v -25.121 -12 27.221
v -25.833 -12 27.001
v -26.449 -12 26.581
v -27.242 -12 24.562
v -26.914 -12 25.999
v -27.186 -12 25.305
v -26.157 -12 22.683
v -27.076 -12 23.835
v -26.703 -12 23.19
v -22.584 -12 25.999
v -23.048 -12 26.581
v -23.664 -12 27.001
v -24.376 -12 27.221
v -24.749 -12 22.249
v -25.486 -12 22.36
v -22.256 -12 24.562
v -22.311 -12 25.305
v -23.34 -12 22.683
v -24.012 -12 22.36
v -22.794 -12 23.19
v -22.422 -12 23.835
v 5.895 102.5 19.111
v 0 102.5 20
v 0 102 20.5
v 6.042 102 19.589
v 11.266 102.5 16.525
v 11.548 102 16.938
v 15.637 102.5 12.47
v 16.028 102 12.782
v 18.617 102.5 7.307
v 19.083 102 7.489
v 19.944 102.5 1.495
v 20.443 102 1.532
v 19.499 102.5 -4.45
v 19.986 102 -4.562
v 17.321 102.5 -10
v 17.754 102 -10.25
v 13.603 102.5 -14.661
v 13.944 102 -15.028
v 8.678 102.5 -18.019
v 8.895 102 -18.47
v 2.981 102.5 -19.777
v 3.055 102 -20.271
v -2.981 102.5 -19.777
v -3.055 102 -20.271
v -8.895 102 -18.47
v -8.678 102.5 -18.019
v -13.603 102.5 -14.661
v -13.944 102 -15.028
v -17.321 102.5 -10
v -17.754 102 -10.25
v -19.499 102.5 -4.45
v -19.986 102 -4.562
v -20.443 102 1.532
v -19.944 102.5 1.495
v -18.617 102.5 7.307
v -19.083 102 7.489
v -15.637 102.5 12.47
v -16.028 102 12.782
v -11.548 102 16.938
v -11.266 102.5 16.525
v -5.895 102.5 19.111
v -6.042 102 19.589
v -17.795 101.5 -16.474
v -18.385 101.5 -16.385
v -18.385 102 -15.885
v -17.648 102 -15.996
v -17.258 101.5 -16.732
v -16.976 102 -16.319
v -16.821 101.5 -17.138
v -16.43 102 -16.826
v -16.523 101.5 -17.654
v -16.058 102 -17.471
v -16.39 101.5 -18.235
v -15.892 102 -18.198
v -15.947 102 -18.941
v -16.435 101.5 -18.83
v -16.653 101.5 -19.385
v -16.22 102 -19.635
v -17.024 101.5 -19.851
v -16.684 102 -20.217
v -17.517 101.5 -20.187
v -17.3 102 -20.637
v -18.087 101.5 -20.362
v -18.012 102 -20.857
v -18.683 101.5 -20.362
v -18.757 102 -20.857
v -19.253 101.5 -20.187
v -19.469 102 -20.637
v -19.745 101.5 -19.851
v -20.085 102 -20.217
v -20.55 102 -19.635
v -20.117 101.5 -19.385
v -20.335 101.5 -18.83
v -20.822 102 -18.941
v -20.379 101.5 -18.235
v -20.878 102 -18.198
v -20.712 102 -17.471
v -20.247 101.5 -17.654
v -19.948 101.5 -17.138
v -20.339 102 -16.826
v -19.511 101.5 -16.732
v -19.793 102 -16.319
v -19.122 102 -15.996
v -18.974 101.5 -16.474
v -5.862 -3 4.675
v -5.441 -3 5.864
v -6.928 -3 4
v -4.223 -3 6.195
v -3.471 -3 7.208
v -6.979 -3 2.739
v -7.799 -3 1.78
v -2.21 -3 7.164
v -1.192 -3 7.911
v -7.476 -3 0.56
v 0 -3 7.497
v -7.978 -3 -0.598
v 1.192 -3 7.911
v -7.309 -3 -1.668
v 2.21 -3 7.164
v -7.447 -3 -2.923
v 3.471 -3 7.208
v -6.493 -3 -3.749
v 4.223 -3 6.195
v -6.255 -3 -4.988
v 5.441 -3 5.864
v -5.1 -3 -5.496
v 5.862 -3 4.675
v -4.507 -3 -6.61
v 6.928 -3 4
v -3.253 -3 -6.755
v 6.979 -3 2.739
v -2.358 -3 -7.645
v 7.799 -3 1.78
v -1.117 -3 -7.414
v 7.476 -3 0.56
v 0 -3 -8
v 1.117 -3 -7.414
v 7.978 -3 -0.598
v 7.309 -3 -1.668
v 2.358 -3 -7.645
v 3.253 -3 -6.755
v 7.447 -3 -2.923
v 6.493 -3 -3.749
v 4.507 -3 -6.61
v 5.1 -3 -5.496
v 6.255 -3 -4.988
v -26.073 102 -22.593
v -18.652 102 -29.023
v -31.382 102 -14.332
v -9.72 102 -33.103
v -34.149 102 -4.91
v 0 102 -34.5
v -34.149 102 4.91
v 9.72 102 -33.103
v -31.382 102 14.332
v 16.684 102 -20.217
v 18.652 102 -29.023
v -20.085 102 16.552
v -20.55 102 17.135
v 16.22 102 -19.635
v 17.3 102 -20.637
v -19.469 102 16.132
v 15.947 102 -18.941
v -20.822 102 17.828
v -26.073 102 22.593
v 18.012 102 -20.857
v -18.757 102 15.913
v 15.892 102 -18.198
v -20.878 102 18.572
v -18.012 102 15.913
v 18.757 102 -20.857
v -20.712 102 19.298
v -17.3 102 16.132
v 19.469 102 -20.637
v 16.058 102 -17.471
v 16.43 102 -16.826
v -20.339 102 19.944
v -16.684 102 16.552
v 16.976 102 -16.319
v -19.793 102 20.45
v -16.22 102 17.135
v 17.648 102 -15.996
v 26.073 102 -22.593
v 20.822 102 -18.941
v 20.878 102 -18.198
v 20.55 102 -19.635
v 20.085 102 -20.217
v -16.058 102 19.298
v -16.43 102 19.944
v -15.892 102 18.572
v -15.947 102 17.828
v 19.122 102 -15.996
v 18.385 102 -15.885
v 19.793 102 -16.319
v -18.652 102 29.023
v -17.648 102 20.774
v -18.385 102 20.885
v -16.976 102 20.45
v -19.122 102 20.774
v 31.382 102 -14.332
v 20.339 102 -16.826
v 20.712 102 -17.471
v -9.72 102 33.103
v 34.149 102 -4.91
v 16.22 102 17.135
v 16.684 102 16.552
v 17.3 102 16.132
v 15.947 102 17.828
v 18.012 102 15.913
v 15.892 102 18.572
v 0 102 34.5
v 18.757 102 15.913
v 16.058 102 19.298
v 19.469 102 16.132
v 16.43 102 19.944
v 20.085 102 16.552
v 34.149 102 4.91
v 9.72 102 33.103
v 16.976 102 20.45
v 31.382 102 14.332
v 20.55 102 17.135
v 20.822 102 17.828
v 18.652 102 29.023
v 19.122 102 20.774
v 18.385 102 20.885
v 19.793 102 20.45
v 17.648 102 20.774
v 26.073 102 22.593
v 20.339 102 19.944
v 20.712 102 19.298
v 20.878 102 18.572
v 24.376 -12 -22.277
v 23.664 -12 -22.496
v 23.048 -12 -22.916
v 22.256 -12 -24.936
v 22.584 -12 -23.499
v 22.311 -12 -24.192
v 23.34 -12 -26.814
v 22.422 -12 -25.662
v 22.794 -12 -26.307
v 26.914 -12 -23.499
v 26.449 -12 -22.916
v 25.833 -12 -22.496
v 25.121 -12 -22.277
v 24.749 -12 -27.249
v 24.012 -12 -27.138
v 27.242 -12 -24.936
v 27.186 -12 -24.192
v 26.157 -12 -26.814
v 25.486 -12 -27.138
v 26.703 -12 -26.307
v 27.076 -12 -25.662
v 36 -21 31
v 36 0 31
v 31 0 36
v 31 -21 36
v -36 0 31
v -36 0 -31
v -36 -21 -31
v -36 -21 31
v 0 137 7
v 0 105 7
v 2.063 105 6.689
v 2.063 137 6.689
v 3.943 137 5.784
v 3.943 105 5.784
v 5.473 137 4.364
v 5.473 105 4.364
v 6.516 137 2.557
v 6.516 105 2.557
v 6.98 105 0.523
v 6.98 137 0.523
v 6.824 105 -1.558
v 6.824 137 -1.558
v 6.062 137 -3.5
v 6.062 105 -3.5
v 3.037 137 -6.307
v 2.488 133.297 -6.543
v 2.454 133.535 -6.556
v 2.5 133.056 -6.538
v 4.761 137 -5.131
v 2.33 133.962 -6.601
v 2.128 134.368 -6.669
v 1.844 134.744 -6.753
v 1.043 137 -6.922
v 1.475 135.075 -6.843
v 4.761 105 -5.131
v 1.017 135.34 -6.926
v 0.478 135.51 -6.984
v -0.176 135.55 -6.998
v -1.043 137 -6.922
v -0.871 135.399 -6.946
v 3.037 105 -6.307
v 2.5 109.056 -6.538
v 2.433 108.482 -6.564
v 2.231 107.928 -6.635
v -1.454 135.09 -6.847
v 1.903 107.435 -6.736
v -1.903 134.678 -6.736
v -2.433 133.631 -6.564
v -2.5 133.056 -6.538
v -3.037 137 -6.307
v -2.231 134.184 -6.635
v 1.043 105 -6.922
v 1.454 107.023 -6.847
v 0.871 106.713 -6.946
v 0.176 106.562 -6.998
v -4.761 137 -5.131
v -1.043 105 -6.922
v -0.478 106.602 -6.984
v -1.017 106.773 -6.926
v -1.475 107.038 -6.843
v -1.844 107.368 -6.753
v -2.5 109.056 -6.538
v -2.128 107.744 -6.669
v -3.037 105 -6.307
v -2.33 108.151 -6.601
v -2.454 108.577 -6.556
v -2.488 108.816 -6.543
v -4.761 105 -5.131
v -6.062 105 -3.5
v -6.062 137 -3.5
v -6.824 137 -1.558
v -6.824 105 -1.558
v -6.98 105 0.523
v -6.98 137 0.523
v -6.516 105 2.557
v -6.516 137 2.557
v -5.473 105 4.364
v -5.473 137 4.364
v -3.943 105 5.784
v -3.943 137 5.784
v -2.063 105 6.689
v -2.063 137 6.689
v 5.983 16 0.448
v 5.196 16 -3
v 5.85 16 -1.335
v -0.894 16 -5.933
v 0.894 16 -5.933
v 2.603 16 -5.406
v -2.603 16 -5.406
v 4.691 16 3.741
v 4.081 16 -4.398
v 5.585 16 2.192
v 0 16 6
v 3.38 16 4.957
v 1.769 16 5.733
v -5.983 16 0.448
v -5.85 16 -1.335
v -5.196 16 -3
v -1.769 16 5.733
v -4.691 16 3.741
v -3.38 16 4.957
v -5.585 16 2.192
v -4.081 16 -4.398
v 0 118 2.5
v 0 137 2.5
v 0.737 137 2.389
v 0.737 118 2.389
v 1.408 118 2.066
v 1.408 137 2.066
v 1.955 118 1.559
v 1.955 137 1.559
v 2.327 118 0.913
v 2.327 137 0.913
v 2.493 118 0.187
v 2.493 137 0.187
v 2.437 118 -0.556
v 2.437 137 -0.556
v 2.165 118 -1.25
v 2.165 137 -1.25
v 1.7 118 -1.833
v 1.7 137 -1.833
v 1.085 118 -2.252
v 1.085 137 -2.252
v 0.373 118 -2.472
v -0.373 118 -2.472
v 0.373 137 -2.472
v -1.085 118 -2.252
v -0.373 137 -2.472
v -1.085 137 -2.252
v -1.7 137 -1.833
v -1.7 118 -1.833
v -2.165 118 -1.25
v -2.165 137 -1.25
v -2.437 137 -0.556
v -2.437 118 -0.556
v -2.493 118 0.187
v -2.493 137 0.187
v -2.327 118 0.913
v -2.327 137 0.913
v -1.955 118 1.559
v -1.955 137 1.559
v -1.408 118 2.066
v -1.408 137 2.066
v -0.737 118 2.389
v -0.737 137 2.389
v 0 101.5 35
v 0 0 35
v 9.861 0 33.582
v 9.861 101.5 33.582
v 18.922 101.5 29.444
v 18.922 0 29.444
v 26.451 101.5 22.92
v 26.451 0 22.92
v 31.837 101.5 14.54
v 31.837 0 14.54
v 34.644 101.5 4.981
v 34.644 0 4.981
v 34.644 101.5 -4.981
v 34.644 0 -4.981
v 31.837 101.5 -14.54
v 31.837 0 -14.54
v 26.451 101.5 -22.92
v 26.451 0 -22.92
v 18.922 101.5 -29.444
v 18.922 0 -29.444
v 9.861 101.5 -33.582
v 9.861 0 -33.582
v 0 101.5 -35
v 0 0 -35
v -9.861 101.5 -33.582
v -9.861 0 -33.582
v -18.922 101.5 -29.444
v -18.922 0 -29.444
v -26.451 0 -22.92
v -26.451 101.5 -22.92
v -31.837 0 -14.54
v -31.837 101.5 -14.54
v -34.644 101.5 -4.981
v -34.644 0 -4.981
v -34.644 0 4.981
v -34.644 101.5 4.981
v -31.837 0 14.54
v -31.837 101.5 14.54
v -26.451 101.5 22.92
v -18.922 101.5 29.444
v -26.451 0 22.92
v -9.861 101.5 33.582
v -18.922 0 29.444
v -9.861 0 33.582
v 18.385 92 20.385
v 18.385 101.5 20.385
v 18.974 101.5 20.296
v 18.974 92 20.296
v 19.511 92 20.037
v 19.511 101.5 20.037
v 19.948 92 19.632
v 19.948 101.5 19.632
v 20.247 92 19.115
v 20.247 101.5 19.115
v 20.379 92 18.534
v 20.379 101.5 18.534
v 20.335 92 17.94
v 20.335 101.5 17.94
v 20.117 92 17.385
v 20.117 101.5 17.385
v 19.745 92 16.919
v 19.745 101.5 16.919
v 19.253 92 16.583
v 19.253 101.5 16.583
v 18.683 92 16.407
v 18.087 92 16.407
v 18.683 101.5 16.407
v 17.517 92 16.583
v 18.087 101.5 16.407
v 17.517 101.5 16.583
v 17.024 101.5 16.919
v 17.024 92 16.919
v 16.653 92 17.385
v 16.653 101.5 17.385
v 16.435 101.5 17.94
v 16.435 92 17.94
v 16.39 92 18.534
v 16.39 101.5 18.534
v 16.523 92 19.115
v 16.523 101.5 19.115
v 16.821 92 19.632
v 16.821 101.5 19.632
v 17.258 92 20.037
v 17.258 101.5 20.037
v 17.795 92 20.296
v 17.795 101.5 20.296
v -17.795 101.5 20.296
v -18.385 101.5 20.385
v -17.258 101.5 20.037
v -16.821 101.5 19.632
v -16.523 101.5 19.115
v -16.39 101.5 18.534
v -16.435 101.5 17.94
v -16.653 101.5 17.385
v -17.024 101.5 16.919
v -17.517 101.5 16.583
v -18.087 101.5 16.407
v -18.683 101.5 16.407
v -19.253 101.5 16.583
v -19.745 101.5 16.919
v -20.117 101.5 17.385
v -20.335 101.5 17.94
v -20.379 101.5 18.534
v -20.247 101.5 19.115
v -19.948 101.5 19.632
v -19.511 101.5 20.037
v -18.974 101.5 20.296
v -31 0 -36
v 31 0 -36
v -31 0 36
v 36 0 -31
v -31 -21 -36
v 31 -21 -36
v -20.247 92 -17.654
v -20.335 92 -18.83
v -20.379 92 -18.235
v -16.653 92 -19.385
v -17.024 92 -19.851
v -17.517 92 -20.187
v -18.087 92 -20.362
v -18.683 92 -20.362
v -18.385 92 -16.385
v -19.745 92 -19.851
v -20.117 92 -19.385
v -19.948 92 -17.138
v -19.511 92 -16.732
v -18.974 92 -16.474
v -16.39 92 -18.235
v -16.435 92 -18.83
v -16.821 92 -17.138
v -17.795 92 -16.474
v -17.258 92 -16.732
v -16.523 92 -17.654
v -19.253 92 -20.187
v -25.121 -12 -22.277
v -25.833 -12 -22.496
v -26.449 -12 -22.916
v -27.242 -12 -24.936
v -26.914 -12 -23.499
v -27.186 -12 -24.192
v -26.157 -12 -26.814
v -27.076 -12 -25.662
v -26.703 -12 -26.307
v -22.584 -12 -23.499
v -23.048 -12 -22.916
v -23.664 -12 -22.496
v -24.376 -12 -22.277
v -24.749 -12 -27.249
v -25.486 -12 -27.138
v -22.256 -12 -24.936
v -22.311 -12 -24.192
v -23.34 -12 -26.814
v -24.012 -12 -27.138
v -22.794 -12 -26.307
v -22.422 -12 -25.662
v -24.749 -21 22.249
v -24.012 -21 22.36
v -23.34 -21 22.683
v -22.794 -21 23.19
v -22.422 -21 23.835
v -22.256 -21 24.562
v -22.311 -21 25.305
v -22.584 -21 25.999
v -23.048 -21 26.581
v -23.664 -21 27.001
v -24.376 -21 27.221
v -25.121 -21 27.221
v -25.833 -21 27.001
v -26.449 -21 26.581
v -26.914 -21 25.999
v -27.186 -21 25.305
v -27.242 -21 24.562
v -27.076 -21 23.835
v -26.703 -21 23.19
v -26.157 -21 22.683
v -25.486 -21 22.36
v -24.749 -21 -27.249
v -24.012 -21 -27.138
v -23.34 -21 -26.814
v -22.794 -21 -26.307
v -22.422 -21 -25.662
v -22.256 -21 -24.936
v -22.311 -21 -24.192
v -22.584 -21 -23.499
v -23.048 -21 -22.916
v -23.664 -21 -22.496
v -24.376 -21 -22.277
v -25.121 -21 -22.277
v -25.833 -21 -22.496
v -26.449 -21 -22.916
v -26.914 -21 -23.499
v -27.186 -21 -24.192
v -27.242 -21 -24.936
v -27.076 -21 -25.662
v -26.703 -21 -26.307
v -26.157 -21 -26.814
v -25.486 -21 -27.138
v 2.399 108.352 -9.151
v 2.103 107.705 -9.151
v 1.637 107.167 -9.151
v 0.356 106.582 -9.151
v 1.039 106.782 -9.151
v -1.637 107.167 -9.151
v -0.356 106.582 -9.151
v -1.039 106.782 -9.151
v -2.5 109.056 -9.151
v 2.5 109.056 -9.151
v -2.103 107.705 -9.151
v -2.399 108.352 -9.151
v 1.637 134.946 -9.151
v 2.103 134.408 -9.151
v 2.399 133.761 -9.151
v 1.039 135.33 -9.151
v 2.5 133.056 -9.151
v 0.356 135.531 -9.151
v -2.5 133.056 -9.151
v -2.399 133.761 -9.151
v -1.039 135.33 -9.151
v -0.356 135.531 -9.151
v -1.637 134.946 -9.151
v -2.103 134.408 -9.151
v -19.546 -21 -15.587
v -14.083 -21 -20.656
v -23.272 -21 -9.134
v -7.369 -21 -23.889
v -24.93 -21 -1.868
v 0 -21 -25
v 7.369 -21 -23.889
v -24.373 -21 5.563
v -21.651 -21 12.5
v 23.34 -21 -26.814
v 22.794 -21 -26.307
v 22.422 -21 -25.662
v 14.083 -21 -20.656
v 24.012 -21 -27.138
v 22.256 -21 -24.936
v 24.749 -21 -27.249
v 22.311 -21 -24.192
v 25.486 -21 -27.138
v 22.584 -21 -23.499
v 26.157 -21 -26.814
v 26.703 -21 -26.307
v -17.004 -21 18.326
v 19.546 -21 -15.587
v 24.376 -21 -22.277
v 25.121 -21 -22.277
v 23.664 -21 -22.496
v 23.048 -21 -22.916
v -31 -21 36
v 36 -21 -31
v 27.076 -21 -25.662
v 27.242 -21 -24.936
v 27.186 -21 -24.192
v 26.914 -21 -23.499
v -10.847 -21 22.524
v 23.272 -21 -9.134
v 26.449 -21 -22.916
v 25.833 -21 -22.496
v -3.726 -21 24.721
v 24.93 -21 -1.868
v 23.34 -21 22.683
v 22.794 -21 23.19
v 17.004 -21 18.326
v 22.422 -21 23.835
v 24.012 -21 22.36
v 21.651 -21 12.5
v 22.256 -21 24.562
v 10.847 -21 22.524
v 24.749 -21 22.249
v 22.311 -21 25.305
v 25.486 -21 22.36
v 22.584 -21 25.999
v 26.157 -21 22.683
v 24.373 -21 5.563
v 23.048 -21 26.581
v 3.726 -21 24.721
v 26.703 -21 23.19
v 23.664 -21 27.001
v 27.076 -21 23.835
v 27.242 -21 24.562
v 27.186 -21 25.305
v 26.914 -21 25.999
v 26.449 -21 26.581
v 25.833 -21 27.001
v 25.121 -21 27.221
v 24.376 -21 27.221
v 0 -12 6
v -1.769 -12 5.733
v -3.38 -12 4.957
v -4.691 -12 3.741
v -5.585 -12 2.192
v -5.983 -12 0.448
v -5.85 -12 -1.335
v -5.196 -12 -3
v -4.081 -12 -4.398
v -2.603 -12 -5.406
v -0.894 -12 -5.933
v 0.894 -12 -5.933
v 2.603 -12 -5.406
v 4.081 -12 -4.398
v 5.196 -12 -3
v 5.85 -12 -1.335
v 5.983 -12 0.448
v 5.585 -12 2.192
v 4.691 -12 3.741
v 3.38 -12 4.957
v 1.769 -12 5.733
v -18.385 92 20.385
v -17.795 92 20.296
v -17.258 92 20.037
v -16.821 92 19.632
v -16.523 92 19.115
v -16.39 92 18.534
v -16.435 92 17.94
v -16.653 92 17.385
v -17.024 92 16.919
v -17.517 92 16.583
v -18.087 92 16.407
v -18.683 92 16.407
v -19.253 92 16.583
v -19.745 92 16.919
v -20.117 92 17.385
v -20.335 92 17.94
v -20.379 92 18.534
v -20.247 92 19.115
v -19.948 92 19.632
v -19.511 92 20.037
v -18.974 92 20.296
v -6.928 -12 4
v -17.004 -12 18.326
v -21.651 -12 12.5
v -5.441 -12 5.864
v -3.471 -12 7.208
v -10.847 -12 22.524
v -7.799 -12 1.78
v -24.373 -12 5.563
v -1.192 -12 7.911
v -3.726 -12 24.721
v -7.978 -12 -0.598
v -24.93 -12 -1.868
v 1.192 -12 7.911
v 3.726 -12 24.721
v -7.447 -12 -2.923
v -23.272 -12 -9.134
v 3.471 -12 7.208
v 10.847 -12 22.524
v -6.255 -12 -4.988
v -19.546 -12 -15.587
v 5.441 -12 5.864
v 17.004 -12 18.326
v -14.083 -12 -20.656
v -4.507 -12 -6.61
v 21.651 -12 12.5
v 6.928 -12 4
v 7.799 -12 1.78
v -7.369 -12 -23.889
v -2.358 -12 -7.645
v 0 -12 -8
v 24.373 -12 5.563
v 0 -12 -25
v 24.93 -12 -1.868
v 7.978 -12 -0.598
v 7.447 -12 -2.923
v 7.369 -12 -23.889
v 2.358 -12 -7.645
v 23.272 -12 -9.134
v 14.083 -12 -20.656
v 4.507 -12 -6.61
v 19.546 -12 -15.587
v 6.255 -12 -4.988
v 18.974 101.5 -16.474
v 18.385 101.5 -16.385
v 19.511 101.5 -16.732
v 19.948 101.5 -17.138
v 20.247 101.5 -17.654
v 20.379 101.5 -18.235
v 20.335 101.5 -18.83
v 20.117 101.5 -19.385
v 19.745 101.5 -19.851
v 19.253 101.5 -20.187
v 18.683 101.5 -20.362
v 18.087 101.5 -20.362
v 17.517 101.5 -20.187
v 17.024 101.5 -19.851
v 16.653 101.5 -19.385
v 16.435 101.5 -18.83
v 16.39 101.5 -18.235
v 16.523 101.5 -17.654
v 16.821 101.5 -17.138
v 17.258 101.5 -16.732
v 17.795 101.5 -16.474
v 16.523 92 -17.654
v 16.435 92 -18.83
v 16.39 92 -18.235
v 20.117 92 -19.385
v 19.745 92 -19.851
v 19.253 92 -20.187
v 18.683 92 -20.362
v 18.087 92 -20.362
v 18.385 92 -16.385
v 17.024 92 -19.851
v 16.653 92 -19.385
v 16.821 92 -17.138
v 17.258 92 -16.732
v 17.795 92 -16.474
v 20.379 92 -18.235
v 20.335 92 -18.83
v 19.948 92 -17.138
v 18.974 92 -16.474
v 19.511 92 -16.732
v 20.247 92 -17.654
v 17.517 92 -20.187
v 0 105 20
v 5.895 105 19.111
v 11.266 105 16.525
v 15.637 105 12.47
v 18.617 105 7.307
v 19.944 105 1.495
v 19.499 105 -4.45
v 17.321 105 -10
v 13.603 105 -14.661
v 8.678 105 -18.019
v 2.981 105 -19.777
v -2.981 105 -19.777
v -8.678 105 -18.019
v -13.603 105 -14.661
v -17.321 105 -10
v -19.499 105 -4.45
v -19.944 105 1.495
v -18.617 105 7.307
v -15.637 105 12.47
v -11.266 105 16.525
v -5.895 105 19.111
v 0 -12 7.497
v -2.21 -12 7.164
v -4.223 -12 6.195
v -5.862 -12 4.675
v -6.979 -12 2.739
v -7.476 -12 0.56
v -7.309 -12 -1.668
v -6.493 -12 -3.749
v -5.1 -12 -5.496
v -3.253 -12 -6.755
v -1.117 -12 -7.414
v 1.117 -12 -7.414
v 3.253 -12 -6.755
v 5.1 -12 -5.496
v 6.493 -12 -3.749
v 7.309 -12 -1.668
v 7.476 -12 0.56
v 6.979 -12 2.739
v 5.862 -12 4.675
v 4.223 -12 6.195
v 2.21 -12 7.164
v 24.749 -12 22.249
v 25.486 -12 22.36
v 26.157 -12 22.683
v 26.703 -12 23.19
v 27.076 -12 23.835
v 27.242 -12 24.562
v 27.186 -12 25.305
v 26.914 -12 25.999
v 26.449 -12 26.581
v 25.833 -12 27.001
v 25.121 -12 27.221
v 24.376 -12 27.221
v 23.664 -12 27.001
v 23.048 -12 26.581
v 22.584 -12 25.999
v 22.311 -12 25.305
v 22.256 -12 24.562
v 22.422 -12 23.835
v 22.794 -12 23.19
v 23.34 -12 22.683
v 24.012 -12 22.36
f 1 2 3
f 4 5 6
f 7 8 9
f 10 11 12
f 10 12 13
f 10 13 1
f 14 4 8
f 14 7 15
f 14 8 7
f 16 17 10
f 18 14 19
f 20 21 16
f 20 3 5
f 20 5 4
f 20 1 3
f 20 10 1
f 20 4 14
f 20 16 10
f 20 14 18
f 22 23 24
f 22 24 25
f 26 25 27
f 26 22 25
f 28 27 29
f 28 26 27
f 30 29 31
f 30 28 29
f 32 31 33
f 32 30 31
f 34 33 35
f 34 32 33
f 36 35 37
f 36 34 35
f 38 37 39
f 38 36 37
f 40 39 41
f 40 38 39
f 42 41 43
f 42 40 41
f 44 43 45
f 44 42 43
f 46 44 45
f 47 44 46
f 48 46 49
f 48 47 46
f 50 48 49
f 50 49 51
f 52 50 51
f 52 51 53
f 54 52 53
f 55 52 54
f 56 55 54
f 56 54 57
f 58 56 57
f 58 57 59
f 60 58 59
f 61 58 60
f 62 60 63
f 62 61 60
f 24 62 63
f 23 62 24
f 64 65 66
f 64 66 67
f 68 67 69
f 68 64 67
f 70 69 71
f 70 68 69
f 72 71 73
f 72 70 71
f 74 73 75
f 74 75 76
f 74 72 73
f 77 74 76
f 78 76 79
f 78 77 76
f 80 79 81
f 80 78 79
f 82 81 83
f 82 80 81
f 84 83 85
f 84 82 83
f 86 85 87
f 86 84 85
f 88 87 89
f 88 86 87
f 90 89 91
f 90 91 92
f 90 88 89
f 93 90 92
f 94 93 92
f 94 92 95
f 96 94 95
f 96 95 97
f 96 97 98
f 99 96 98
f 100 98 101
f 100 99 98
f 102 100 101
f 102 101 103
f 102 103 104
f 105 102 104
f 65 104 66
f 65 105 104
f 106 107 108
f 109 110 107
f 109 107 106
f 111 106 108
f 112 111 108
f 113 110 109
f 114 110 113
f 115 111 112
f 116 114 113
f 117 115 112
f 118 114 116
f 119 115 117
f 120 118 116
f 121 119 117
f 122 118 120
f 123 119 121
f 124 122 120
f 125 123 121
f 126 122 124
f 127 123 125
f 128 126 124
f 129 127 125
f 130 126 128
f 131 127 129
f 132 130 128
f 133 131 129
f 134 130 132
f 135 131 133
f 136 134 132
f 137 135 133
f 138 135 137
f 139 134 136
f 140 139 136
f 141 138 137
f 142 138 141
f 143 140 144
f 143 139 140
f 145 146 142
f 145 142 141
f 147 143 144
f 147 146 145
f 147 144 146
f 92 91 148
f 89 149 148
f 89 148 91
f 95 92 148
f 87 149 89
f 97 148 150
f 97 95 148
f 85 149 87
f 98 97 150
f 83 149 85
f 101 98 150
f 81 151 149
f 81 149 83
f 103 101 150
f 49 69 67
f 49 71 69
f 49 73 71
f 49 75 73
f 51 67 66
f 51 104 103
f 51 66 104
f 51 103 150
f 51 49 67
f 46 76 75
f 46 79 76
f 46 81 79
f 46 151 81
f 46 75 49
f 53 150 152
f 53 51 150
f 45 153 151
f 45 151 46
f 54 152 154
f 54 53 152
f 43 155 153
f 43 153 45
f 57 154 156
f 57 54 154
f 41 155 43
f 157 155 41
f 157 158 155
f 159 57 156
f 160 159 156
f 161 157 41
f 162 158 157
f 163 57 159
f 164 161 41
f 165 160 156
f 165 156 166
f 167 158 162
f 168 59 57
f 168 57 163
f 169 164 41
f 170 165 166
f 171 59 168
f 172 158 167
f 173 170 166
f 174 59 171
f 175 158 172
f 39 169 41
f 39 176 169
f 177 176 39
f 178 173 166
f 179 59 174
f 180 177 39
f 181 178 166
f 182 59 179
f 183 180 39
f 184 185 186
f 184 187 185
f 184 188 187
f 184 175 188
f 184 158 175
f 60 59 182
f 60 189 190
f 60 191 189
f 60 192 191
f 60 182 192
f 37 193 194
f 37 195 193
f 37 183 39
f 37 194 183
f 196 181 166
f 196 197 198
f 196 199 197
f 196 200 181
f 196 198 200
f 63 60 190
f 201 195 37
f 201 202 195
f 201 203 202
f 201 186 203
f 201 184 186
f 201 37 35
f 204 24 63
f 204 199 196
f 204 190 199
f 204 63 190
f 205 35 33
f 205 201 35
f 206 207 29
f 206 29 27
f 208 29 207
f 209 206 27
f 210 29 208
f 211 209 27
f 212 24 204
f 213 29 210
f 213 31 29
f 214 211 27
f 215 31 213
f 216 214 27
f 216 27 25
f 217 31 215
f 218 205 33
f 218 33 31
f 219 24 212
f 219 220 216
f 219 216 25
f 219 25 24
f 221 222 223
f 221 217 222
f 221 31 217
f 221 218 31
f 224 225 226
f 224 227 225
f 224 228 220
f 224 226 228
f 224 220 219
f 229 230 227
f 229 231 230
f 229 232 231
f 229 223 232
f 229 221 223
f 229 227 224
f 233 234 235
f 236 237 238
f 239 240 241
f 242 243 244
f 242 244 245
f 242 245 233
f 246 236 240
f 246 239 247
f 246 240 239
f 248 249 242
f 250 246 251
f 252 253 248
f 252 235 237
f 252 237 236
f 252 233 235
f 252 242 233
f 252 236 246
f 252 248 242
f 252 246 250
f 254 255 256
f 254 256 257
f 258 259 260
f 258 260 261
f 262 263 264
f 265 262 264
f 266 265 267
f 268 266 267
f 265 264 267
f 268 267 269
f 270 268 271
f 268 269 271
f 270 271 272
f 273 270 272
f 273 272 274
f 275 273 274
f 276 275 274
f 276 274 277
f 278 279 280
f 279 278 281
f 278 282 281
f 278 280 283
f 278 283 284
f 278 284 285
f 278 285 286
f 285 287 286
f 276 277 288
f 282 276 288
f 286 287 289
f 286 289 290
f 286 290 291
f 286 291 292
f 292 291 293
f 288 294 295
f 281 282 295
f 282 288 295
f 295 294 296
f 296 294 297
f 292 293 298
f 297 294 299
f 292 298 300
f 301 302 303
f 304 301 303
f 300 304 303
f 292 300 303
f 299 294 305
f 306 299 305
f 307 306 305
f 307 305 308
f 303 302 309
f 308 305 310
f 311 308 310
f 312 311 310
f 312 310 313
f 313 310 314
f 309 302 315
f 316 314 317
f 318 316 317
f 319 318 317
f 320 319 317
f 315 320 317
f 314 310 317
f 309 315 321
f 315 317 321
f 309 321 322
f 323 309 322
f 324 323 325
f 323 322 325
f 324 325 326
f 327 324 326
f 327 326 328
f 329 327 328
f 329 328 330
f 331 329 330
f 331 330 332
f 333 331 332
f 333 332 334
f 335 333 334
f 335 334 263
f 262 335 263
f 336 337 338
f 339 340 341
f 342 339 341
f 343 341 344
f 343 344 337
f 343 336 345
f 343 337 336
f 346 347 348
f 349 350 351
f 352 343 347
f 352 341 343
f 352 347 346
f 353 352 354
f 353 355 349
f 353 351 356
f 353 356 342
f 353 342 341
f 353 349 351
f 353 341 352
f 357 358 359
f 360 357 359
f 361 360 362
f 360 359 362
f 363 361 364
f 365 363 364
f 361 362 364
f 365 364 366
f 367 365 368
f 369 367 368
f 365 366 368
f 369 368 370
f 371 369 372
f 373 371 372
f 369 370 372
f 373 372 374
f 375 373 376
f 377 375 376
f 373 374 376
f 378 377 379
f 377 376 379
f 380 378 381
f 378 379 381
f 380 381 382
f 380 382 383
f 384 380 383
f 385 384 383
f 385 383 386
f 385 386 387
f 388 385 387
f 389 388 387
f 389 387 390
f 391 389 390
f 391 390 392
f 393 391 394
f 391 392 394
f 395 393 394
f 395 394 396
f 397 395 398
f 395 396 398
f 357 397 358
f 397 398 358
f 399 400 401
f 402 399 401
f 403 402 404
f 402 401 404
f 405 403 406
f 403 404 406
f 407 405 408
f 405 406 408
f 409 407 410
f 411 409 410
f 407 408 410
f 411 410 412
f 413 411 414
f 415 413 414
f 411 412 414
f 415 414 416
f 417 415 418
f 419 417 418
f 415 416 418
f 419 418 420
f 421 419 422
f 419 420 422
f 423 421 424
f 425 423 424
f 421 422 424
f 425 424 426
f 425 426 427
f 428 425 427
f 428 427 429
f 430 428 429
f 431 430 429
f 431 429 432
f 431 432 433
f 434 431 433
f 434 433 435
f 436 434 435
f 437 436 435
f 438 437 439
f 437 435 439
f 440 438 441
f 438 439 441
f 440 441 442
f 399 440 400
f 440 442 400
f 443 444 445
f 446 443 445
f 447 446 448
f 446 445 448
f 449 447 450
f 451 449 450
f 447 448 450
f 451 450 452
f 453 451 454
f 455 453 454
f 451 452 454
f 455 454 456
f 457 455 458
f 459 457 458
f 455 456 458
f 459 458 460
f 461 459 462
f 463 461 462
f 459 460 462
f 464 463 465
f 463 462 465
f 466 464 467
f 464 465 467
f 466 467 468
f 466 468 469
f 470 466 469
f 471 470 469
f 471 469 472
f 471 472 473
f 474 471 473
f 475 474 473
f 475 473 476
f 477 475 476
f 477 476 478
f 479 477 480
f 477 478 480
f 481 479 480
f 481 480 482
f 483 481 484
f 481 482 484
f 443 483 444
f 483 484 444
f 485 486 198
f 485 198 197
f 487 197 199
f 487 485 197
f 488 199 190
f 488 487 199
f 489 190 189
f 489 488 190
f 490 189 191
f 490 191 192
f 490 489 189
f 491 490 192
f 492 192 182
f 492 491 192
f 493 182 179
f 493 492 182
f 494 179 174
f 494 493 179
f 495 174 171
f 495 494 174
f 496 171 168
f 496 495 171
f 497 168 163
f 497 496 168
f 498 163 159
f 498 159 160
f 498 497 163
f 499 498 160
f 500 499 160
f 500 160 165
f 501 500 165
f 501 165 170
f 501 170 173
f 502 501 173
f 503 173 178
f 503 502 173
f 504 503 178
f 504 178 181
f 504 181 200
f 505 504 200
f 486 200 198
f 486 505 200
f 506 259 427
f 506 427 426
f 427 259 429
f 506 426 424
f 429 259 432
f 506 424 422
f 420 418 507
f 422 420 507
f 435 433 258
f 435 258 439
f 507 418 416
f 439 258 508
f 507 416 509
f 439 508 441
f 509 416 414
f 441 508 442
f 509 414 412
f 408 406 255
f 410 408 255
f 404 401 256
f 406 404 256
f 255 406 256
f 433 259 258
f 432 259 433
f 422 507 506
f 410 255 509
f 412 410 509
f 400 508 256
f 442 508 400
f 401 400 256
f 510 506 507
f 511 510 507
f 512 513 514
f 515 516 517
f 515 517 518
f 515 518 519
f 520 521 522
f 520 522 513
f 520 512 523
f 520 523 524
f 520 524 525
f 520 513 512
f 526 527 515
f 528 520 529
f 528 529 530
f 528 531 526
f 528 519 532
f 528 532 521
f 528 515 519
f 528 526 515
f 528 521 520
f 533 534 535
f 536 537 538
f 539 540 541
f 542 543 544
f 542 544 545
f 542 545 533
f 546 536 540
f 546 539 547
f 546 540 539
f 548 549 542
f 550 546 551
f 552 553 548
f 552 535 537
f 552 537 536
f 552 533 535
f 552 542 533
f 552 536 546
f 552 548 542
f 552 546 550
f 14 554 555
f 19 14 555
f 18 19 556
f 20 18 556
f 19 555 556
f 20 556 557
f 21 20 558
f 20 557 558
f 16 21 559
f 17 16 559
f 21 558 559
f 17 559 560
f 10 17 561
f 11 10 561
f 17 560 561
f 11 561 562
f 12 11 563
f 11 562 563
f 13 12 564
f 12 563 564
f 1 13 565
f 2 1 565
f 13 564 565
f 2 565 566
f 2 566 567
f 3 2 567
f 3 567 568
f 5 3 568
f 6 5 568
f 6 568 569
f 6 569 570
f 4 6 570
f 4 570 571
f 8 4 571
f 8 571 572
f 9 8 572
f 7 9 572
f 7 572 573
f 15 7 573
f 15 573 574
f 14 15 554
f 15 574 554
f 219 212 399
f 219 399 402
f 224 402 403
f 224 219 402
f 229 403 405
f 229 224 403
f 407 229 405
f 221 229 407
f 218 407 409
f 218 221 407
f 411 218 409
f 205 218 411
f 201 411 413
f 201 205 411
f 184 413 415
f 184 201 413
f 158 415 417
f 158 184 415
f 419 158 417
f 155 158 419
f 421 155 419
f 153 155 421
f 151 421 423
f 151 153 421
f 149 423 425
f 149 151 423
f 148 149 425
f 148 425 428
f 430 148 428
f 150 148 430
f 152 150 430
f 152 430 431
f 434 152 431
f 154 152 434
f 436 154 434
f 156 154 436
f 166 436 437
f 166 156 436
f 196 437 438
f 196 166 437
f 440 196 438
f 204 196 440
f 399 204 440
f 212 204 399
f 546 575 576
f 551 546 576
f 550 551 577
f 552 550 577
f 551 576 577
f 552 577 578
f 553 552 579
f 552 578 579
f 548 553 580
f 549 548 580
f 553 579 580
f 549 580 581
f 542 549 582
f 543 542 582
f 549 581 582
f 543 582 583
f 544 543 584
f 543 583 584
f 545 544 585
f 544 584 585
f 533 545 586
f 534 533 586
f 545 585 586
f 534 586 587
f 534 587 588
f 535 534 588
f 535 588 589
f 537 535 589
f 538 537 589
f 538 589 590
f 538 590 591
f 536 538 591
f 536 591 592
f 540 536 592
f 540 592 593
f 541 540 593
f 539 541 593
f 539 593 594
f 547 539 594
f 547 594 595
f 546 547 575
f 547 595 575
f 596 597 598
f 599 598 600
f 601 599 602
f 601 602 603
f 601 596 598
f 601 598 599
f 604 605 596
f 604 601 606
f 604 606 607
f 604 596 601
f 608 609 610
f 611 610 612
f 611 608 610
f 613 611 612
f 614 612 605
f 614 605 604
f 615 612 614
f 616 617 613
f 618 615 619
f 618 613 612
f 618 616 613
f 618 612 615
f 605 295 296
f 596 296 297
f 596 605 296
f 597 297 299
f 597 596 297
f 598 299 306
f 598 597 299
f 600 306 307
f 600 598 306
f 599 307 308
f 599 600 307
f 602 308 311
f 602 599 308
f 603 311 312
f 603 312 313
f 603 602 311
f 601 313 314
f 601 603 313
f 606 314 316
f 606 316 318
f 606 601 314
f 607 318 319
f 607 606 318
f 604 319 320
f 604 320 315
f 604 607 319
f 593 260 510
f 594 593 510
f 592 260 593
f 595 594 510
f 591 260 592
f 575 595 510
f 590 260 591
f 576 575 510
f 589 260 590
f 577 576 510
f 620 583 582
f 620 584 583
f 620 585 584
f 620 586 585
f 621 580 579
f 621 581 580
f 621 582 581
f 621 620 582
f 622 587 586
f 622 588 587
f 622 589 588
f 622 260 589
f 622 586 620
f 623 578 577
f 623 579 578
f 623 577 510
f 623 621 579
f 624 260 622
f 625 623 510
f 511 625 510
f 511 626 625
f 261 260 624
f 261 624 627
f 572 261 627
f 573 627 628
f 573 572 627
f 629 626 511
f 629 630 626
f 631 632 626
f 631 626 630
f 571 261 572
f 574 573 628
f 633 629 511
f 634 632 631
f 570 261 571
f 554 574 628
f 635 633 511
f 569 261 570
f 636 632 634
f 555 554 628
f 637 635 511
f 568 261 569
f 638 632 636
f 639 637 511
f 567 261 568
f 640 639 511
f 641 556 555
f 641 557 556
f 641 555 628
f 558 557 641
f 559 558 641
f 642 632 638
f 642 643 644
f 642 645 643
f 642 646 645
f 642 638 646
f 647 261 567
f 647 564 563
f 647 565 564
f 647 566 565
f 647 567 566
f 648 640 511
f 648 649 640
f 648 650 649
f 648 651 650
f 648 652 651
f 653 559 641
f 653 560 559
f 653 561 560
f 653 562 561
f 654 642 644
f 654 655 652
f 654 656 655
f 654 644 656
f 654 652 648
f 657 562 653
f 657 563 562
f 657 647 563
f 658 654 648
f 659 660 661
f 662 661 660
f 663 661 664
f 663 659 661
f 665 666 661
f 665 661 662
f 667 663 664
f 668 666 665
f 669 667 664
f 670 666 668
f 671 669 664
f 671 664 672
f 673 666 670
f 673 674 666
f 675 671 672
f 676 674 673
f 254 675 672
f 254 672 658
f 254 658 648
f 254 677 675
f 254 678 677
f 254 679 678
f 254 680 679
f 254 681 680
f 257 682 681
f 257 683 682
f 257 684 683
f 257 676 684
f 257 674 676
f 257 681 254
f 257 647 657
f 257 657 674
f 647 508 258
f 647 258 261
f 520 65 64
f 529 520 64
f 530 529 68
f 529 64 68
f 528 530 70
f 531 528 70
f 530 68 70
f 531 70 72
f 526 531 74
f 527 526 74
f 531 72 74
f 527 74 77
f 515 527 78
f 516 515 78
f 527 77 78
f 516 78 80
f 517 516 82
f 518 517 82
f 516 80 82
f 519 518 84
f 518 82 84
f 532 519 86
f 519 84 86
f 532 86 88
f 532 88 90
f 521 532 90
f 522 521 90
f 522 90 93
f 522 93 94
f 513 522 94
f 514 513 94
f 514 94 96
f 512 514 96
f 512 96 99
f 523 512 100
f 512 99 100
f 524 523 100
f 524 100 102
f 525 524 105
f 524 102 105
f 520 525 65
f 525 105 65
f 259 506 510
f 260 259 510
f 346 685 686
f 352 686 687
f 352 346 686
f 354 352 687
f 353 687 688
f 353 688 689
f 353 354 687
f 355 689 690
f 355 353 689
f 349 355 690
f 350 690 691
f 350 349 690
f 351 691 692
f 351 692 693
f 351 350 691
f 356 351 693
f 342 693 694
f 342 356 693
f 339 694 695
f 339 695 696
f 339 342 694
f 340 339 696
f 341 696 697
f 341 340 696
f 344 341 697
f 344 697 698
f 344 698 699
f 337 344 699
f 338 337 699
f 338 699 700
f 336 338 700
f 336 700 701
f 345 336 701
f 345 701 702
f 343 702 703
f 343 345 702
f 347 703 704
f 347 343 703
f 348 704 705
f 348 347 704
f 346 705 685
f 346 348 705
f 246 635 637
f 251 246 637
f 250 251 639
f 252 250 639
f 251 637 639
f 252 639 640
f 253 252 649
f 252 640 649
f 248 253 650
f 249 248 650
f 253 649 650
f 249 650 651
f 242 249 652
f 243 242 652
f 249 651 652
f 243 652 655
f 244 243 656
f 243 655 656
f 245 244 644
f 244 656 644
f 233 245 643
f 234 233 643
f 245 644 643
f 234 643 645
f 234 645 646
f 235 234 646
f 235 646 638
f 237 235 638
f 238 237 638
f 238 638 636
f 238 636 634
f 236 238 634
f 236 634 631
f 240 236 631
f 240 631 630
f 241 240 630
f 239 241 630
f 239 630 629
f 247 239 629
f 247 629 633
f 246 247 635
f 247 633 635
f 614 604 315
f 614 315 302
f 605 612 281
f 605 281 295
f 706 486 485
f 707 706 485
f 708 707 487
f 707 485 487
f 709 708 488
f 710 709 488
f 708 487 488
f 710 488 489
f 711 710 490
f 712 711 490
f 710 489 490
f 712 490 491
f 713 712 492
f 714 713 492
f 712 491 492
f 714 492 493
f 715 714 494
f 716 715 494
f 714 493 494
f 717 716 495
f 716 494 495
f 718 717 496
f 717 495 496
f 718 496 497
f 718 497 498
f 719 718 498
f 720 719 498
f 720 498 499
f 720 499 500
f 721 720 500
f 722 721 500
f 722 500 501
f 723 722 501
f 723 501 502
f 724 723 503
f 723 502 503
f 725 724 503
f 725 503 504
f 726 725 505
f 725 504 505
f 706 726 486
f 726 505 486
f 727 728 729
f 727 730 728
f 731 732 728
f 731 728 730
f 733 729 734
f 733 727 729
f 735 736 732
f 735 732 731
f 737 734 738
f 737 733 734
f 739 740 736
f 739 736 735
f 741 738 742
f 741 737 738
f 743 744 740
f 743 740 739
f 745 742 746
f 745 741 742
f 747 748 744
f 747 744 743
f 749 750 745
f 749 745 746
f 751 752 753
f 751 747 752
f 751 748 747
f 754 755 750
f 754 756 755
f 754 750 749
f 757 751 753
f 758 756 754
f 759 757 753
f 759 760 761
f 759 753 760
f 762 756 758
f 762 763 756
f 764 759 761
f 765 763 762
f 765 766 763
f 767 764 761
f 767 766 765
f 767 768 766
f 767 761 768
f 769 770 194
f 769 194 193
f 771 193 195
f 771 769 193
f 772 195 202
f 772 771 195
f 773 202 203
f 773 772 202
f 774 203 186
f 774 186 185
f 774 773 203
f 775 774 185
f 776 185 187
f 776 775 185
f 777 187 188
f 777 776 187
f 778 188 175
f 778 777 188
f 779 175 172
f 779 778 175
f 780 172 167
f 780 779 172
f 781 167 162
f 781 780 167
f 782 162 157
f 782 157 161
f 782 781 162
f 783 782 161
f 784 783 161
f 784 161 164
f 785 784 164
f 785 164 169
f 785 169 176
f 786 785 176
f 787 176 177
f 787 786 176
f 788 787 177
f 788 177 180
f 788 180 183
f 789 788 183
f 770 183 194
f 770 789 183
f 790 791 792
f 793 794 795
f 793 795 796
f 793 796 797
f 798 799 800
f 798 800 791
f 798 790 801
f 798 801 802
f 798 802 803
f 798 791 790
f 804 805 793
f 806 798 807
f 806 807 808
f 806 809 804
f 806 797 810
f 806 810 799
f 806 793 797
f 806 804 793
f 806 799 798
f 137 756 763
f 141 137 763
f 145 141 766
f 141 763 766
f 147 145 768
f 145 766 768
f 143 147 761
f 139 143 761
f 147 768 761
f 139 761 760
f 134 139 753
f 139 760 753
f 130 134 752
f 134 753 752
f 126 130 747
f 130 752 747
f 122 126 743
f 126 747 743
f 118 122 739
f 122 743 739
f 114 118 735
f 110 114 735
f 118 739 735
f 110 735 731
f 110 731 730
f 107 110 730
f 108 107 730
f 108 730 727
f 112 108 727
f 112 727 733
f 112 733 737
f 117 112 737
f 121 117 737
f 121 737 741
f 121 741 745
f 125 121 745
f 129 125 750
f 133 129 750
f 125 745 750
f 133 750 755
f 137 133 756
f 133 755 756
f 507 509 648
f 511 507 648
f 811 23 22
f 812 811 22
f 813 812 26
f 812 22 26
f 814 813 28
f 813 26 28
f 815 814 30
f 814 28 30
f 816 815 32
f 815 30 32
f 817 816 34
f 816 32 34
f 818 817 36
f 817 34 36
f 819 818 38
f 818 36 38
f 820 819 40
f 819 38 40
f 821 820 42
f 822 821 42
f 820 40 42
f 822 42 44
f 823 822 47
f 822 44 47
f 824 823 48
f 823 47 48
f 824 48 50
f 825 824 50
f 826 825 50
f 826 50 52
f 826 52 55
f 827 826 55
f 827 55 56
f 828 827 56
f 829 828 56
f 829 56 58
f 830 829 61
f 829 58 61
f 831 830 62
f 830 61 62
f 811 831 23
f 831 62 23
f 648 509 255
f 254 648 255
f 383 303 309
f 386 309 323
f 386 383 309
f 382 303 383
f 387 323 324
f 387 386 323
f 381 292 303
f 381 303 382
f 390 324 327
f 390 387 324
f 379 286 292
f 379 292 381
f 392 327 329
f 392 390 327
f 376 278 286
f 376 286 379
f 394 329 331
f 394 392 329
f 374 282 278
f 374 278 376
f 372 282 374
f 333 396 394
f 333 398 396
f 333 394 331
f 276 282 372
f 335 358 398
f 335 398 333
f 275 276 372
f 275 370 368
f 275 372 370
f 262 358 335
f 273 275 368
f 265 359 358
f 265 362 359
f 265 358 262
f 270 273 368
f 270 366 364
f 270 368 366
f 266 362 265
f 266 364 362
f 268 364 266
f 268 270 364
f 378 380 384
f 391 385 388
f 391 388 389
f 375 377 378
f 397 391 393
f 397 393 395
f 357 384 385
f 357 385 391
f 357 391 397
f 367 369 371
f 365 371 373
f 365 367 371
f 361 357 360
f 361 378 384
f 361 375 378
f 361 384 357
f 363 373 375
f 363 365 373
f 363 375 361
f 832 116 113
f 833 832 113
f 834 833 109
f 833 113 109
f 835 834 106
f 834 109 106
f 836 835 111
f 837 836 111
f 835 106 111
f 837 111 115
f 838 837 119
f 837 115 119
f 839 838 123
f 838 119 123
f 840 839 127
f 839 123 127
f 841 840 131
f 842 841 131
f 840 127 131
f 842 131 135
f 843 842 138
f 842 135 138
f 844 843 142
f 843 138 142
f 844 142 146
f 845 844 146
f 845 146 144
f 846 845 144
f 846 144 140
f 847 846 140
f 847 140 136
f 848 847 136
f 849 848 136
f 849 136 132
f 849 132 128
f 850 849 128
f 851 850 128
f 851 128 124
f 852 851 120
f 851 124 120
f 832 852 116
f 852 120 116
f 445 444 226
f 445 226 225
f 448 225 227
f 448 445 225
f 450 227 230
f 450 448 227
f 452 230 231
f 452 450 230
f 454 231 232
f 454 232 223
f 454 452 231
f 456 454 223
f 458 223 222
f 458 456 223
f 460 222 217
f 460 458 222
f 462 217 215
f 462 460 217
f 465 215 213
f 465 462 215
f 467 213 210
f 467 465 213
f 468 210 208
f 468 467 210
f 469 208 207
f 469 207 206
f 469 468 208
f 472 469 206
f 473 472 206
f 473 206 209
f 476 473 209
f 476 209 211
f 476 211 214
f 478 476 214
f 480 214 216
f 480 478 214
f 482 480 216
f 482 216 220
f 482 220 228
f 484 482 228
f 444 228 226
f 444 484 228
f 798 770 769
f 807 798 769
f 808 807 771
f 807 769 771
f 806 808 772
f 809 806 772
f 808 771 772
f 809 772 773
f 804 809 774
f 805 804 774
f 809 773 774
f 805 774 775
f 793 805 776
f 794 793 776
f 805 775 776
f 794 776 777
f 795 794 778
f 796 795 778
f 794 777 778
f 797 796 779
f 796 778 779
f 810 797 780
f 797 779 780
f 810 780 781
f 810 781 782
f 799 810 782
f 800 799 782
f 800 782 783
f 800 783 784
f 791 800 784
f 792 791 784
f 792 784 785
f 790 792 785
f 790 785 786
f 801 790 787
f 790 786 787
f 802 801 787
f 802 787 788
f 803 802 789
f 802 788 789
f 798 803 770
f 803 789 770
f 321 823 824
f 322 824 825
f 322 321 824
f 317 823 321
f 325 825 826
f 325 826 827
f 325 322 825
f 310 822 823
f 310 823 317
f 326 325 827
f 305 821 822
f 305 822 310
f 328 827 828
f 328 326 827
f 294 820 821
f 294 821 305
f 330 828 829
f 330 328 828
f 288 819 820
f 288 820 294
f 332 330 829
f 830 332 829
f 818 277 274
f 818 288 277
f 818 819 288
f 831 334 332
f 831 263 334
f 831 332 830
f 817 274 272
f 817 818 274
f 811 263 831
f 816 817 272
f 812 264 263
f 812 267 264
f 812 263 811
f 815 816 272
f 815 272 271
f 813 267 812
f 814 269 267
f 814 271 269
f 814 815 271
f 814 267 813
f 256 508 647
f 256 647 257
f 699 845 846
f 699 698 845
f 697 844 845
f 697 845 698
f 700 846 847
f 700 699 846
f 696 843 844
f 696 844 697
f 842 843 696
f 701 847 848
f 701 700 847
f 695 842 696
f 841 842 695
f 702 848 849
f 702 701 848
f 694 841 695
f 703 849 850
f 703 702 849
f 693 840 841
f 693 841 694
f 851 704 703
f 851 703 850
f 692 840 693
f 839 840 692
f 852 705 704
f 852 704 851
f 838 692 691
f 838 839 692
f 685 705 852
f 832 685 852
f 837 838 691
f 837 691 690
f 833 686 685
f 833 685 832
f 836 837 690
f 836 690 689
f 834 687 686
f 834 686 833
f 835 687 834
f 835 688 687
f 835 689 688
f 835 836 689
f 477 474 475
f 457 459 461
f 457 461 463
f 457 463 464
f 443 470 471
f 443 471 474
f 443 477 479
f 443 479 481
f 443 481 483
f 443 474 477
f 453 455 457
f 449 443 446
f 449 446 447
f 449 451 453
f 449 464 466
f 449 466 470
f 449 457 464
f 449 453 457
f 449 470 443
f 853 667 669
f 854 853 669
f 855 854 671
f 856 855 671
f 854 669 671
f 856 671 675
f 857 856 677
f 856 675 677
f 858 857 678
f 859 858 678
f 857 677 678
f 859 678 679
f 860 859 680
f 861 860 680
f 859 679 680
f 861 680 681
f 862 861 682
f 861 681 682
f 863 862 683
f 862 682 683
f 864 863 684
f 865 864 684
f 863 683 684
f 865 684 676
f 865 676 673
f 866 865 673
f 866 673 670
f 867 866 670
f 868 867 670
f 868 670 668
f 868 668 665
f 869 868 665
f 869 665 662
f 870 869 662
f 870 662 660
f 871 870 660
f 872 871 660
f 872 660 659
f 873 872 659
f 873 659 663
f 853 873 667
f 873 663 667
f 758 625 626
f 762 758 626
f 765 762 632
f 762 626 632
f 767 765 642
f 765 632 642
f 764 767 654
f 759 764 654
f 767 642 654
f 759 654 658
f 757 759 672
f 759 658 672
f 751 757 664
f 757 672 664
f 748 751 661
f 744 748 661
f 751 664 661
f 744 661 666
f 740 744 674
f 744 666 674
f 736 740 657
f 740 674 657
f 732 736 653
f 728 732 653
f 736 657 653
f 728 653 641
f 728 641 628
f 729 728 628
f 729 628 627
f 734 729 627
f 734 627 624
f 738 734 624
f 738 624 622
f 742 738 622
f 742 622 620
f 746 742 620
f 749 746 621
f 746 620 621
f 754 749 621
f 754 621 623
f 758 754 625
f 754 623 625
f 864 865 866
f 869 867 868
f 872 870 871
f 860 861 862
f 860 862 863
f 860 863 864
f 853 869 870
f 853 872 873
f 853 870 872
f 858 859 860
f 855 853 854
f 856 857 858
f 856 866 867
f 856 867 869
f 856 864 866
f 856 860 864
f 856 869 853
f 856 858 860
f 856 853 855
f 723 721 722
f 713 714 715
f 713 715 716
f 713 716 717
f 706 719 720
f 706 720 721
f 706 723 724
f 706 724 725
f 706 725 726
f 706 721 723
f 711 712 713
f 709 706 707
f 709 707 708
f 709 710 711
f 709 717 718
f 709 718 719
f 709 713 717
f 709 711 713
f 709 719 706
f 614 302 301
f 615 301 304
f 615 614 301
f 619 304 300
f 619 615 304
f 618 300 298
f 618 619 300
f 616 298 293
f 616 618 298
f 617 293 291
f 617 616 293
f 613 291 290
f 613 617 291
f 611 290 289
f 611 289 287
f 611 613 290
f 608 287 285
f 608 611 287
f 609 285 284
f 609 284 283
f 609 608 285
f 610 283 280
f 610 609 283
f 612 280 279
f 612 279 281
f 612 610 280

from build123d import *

# Parameters (mm, degrees)
SKETCH_1_R             = 35
EXTRUDE_1_DEPTH        = 102
SKETCH_2_R             = 20
EXTRUDE_2_DEPTH        = 3
SKETCH_3_R             = 7
EXTRUDE_3_DEPTH        = 32
SKETCH_4_W             = 72
SKETCH_4_H             = 72
EXTRUDE_4_DEPTH        = 21
CHAMFER_1_SIZE         = 5
SKETCH_5_R             = 2
CUT_EXTRUDE_1_DEPTH    = 10
CHAMFER_2_SIZE         = 0.5
SKETCH_6_R             = 25
CUT_EXTRUDE_2_DEPTH    = 9
SKETCH_7_R             = 8
CUT_EXTRUDE_3_DEPTH    = 9
SKETCH_9_R             = 2.5
CUT_EXTRUDE_4_DEPTH    = 9
SKETCH_10_R            = 2.5
CUT_EXTRUDE_5_DEPTH    = 19
EXTRUDE_1_2_DEPTH      = 1
EXTRUDE_1_2_DEPTH_BACK = 2
SKETCH_13_R            = 7.497429265
SKETCH_13_R_2          = 6
EXTRUDE_2_2_DEPTH      = 9
CUT_EXTRUDE_START      = -19
SKETCH_14_R            = 6
CUT_EXTRUDE_6_DEPTH    = 19


with BuildPart() as part:
    # Эскиз1 → Extrude 1 (new body)
    with BuildSketch(Plane(origin=(0, 0, 0), x_dir=(1, 0, 0), z_dir=(0, 1, 0))):
        with Locations(Location((0, 0, 0), (0, 0, 270))):
            Circle(SKETCH_1_R)
    extrude(amount=EXTRUDE_1_DEPTH)

    # Эскиз2 → Extrude 2 (add)
    with BuildSketch(Plane(origin=(0, 102, 0), x_dir=(1, 0, 0), z_dir=(0, 1, 0))):
        with Locations(Location((0, 0, 0), (0, 0, 270))):
            Circle(SKETCH_2_R)
    extrude(amount=EXTRUDE_2_DEPTH)

    # Эскиз3 → Вытянуть3 (add)
    with BuildSketch(Plane(origin=(0, 105, 0), x_dir=(1, 0, 0), z_dir=(0, 1, 0))):
        with Locations(Location((0, 0, 0), (0, 0, 270))):
            Circle(SKETCH_3_R)
    extrude(amount=EXTRUDE_3_DEPTH)

    # Эскиз4 → Вытянуть4 (add)
    with BuildSketch(Plane.XZ):
        Rectangle(SKETCH_4_W, SKETCH_4_H)
    extrude(amount=EXTRUDE_4_DEPTH)

    # Фаска1
    chamfer_1_edges = [part.edges().sort_by_distance(p)[0] for p in [
        (-36, -10.5, 36),
        (-36, -10.5, -36),
        (36, -10.5, -36),
        (36, -10.5, 36),
    ]]
    chamfer(chamfer_1_edges, length=CHAMFER_1_SIZE)

    # Эскиз5 → Вырез-Вытянуть1 (cut)
    with BuildSketch(Plane(origin=(0, 102, 0), x_dir=(1, 0, 0), z_dir=(0, 1, 0))):
        with Locations(Location((-18.384776311, 18.384776311, 0), (0, 0, 270))):
            Circle(SKETCH_5_R)
        with Locations(Location((18.384776311, 18.384776311, 0), (0, 0, 270))):
            Circle(SKETCH_5_R)
        with Locations(Location((-18.384776311, -18.384776311, 0), (0, 0, 270))):
            Circle(SKETCH_5_R)
        with Locations(Location((18.384776311, -18.384776311, 0), (0, 0, 270))):
            Circle(SKETCH_5_R)
    extrude(amount=-CUT_EXTRUDE_1_DEPTH, mode=Mode.SUBTRACT)

    # Фаска2
    chamfer_2_edges = [part.edges().sort_by_distance(p)[0] for p in [
        (0, 102, -35),
        (-18.384776311, 102, -20.384776311),
        (18.384776311, 102, -20.384776311),
        (-18.384776311, 102, 16.384776311),
        (0, 102, -20),
        (18.384776311, 102, 16.384776311),
    ]]
    chamfer(chamfer_2_edges, length=CHAMFER_2_SIZE)

    # Эскиз6 → Вырез-Вытянуть2 (cut)
    with BuildSketch(Plane.XZ.offset(21)):
        with Locations(Location((0, 0, 0), (0, 0, 270))):
            Circle(SKETCH_6_R)
    extrude(amount=-CUT_EXTRUDE_2_DEPTH, mode=Mode.SUBTRACT)

    # Эскиз7 → Вырез-Вытянуть3 (cut)
    with BuildSketch(Plane.XZ.offset(12)):
        with Locations(Location((0, 0, 0), (0, 0, 270))):
            Circle(SKETCH_7_R)
    extrude(amount=-CUT_EXTRUDE_3_DEPTH, mode=Mode.SUBTRACT)

    # Эскиз9 → Вырез-Вытянуть4 (cut)
    with BuildSketch(Plane.XZ.offset(21)):
        with Locations(Location((-24.748737342, 24.748737342, 0), (0, 0, 270))):
            Circle(SKETCH_9_R)
        with Locations(Location((24.748737342, 24.748737342, 0), (0, 0, 270))):
            Circle(SKETCH_9_R)
        with Locations(Location((-24.748737342, -24.748737342, 0), (0, 0, 270))):
            Circle(SKETCH_9_R)
        with Locations(Location((24.748737342, -24.748737342, 0), (0, 0, 270))):
            Circle(SKETCH_9_R)
    extrude(amount=-CUT_EXTRUDE_4_DEPTH, mode=Mode.SUBTRACT)

    # Эскиз10 → Вырез-Вытянуть5 (cut)
    with BuildSketch(Plane(origin=(0, 137, 0), x_dir=(1, 0, 0), z_dir=(0, 1, 0))):
        with Locations(Location((0, 0, 0), (0, 0, 270))):
            Circle(SKETCH_10_R)
    extrude(amount=-CUT_EXTRUDE_5_DEPTH, mode=Mode.SUBTRACT)

    # Эскиз12 → Extrude 1 2 (add, two sides: drawn at the far end of the back side and taken through both)
    with BuildSketch(Plane.XY.offset(-7.151021082).offset(-EXTRUDE_1_2_DEPTH_BACK)):
        with BuildLine():
            Line((2.5, 133.056281521), (2.5, 109.056281521))
            ThreePointArc((2.5, 109.056281521), (0, 106.556281521), (-2.5, 109.056281521))
            Line((-2.5, 109.056281521), (-2.5, 133.056281521))
            ThreePointArc((-2.5, 133.056281521), (0, 135.556281521), (2.5, 133.056281521))
        make_face()
    extrude(amount=EXTRUDE_1_2_DEPTH + EXTRUDE_1_2_DEPTH_BACK)

    # Эскиз13 → Extrude 2 2 (add)
    with BuildSketch(Plane.XZ.offset(3)):
        with Locations(Location((0, 0, 0), (0, 0, 90))):
            Circle(SKETCH_13_R)
        with Locations(Location((0, 0, 0), (0, 0, 90))):
            Circle(SKETCH_13_R_2, mode=Mode.SUBTRACT)
    extrude(amount=EXTRUDE_2_2_DEPTH)

    # Эскиз14 → Вырез-Вытянуть6 (cut)
    with BuildSketch(Plane.XZ.offset(3).offset(CUT_EXTRUDE_START)):
        with Locations(Location((0, 0, 0), (0, 0, 90))):
            Circle(SKETCH_14_R)
    extrude(amount=CUT_EXTRUDE_6_DEPTH, mode=Mode.SUBTRACT)


solid = part.part
